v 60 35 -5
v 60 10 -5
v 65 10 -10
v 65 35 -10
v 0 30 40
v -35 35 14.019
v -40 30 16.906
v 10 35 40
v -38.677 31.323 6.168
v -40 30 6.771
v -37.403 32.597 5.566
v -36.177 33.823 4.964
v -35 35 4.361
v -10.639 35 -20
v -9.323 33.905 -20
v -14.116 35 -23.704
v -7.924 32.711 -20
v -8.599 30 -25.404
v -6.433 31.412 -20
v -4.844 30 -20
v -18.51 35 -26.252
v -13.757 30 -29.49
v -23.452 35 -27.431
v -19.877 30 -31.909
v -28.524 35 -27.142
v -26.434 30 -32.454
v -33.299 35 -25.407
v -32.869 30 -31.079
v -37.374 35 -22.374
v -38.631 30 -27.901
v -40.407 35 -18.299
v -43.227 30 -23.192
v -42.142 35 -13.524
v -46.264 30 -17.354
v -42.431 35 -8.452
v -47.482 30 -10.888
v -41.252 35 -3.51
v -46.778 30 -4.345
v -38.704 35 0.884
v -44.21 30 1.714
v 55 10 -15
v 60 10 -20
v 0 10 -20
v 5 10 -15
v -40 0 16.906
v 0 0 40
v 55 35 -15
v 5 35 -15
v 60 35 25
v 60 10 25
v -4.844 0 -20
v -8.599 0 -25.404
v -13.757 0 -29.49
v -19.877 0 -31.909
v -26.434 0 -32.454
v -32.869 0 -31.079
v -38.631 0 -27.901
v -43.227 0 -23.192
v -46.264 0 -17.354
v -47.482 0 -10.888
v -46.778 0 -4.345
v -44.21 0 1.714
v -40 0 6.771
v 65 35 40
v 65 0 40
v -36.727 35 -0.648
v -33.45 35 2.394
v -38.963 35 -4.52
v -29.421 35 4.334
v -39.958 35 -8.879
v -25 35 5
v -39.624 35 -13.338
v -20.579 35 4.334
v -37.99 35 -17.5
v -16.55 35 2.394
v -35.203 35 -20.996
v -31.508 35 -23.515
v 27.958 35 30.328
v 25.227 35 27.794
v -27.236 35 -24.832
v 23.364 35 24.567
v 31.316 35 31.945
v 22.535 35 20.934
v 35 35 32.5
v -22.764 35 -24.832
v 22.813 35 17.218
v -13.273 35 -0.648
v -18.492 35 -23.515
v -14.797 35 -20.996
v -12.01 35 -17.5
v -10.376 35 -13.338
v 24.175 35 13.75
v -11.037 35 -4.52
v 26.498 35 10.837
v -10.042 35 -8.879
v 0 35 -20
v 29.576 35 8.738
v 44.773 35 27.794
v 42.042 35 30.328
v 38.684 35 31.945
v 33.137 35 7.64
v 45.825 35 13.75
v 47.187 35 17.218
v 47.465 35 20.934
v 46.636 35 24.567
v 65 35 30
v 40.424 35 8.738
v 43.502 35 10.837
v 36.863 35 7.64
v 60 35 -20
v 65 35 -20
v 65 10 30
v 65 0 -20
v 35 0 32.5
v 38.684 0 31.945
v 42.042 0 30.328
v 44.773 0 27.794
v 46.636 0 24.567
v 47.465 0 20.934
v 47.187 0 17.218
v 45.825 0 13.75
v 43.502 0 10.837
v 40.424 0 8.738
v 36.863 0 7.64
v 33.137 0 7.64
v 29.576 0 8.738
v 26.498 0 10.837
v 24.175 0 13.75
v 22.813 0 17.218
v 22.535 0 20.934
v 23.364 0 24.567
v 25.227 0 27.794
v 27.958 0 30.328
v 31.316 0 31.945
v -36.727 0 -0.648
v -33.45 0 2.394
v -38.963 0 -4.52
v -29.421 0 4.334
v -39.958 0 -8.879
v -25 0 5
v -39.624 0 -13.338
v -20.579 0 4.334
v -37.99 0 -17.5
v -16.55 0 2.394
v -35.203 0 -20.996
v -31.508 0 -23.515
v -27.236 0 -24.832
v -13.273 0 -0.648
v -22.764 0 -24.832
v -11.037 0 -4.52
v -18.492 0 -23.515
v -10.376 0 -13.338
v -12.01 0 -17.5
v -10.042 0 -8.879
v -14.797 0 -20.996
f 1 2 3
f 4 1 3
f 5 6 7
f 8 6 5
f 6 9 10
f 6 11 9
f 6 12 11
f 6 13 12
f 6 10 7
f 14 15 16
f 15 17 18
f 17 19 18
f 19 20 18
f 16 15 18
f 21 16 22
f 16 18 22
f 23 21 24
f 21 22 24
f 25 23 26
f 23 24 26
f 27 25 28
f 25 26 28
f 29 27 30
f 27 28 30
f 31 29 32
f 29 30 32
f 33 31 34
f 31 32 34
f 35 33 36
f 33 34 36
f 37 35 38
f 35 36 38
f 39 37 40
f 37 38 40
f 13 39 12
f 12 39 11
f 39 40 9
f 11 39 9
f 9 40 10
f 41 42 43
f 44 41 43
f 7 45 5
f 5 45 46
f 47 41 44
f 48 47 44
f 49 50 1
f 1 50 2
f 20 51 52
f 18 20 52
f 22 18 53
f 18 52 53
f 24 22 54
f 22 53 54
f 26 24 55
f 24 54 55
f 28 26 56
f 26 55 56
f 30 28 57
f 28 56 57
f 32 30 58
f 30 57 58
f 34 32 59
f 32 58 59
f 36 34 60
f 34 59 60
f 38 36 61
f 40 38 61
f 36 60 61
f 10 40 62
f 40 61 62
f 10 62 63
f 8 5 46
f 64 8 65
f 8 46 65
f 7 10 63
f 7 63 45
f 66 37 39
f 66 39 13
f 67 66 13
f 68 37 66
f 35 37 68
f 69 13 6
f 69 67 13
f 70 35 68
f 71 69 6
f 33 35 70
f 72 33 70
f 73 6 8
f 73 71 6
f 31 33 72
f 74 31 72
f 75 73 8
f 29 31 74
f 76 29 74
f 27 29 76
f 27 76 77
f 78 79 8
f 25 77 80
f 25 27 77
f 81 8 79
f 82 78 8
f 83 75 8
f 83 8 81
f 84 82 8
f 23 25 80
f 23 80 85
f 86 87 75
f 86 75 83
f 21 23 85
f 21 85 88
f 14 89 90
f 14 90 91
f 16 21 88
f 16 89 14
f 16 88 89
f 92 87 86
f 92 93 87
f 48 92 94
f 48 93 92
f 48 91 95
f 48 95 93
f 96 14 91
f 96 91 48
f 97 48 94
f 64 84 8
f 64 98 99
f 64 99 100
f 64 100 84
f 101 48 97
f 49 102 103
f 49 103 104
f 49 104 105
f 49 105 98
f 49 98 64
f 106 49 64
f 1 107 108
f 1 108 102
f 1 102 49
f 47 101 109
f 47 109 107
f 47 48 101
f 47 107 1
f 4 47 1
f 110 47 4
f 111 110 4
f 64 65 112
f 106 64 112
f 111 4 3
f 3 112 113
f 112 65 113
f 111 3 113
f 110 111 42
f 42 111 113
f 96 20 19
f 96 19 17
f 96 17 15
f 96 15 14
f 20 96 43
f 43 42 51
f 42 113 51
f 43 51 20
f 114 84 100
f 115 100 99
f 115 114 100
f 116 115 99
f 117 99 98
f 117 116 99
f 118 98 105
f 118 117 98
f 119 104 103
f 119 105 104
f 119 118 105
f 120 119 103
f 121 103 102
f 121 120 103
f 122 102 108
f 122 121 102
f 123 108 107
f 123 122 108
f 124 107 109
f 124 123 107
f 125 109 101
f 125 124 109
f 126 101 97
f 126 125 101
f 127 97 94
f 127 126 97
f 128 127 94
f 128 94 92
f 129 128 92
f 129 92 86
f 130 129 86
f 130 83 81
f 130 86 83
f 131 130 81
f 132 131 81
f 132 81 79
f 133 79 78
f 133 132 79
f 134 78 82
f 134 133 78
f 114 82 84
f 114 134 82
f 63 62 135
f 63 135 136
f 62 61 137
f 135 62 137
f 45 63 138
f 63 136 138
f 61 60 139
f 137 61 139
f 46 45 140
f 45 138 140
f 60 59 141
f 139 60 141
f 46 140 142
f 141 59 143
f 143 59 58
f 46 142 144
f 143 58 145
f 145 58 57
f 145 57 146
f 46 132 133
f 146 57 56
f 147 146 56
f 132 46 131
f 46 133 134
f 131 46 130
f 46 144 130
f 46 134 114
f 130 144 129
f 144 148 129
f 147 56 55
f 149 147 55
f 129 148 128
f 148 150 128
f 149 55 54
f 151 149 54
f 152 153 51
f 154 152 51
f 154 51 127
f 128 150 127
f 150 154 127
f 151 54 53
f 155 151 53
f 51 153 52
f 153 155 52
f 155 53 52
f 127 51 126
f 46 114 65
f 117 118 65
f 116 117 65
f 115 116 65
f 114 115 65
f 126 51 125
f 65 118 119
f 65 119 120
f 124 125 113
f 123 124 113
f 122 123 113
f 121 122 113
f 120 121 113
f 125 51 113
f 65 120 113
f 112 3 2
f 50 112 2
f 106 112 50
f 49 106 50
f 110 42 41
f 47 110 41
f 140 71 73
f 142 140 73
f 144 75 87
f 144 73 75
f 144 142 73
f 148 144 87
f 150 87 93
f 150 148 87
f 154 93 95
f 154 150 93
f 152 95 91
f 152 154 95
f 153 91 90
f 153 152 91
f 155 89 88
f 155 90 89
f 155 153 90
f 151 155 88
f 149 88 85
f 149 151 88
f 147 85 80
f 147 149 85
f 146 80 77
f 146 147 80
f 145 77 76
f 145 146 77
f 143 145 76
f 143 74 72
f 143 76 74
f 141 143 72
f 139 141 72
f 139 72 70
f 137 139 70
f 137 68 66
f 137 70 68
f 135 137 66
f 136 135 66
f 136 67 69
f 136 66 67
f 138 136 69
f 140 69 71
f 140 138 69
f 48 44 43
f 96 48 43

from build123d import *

# Parameters (mm, degrees)
BOSS_EXTRUDE1_DEPTH     = 35
CUT_EXTRUDE3_DEPTH      = 84.964278119
CUT_EXTRUDE3_DEPTH_BACK = 84.964278119
SKETCH2_R               = 12.5
SKETCH2_R_2             = 15
CUT_EXTRUDE4_START      = 10
CUT_EXTRUDE4_DEPTH      = 25
CHAMFER1_SIZE           = 5


with BuildPart() as part:
    # Sketch1 → Boss-Extrude1 (new body)
    with BuildSketch(Plane(origin=(0, 0, 0), x_dir=(1, 0, 0), z_dir=(0, 1, 0))):
        with BuildLine():
            Line((-40, -16.905989232), (0, -40))
            Line((0, -40), (65, -40))
            Line((65, -40), (65, 20))
            Line((65, 20), (-4.844355629, 20))
            ThreePointArc((-4.844355629, 20), (-38.631222116, 27.900831925), (-40, -6.770509831))
            Line((-40, -6.770509831), (-40, -16.905989232))
        make_face()
    extrude(amount=BOSS_EXTRUDE1_DEPTH)

    # Sketch2 → Cut-Extrude3 (cut, two sides: drawn at the far end of the back side and taken through both)
    with BuildSketch(Plane(origin=(0, 0, 0), x_dir=(1, 0, 0), z_dir=(0, 1, 0)).offset(-CUT_EXTRUDE3_DEPTH_BACK)):
        with Locations(Location((35, -20, 0), (0, 0, 270))):
            Circle(SKETCH2_R)
        with Locations(Location((-25, 10, 0), (0, 0, 270))):
            Circle(SKETCH2_R_2)
    extrude(amount=CUT_EXTRUDE3_DEPTH + CUT_EXTRUDE3_DEPTH_BACK, mode=Mode.SUBTRACT)

    # Sketch3 → Cut-Extrude4 (cut)
    with BuildSketch(Plane(origin=(0, 0, 0), x_dir=(1, 0, 0), z_dir=(0, 1, 0)).offset(CUT_EXTRUDE4_START)):
        Polygon((0, 20), (60, 20), (55, 15), (5, 15), align=None)
        Polygon((65, 10), (65, -30), (60, -25), (60, 5), align=None)
    extrude(amount=CUT_EXTRUDE4_DEPTH, mode=Mode.SUBTRACT)

    # Chamfer1
    chamfer1_edges = [part.edges().sort_by_distance(p)[0] for p in [
        (-20, 35, 28.452994616),
        (-40, 35, 11.838249532),
        (-38.631222116, 35, -27.900831925),
    ]]
    chamfer(chamfer1_edges, length=CHAMFER1_SIZE)


solid = part.part
